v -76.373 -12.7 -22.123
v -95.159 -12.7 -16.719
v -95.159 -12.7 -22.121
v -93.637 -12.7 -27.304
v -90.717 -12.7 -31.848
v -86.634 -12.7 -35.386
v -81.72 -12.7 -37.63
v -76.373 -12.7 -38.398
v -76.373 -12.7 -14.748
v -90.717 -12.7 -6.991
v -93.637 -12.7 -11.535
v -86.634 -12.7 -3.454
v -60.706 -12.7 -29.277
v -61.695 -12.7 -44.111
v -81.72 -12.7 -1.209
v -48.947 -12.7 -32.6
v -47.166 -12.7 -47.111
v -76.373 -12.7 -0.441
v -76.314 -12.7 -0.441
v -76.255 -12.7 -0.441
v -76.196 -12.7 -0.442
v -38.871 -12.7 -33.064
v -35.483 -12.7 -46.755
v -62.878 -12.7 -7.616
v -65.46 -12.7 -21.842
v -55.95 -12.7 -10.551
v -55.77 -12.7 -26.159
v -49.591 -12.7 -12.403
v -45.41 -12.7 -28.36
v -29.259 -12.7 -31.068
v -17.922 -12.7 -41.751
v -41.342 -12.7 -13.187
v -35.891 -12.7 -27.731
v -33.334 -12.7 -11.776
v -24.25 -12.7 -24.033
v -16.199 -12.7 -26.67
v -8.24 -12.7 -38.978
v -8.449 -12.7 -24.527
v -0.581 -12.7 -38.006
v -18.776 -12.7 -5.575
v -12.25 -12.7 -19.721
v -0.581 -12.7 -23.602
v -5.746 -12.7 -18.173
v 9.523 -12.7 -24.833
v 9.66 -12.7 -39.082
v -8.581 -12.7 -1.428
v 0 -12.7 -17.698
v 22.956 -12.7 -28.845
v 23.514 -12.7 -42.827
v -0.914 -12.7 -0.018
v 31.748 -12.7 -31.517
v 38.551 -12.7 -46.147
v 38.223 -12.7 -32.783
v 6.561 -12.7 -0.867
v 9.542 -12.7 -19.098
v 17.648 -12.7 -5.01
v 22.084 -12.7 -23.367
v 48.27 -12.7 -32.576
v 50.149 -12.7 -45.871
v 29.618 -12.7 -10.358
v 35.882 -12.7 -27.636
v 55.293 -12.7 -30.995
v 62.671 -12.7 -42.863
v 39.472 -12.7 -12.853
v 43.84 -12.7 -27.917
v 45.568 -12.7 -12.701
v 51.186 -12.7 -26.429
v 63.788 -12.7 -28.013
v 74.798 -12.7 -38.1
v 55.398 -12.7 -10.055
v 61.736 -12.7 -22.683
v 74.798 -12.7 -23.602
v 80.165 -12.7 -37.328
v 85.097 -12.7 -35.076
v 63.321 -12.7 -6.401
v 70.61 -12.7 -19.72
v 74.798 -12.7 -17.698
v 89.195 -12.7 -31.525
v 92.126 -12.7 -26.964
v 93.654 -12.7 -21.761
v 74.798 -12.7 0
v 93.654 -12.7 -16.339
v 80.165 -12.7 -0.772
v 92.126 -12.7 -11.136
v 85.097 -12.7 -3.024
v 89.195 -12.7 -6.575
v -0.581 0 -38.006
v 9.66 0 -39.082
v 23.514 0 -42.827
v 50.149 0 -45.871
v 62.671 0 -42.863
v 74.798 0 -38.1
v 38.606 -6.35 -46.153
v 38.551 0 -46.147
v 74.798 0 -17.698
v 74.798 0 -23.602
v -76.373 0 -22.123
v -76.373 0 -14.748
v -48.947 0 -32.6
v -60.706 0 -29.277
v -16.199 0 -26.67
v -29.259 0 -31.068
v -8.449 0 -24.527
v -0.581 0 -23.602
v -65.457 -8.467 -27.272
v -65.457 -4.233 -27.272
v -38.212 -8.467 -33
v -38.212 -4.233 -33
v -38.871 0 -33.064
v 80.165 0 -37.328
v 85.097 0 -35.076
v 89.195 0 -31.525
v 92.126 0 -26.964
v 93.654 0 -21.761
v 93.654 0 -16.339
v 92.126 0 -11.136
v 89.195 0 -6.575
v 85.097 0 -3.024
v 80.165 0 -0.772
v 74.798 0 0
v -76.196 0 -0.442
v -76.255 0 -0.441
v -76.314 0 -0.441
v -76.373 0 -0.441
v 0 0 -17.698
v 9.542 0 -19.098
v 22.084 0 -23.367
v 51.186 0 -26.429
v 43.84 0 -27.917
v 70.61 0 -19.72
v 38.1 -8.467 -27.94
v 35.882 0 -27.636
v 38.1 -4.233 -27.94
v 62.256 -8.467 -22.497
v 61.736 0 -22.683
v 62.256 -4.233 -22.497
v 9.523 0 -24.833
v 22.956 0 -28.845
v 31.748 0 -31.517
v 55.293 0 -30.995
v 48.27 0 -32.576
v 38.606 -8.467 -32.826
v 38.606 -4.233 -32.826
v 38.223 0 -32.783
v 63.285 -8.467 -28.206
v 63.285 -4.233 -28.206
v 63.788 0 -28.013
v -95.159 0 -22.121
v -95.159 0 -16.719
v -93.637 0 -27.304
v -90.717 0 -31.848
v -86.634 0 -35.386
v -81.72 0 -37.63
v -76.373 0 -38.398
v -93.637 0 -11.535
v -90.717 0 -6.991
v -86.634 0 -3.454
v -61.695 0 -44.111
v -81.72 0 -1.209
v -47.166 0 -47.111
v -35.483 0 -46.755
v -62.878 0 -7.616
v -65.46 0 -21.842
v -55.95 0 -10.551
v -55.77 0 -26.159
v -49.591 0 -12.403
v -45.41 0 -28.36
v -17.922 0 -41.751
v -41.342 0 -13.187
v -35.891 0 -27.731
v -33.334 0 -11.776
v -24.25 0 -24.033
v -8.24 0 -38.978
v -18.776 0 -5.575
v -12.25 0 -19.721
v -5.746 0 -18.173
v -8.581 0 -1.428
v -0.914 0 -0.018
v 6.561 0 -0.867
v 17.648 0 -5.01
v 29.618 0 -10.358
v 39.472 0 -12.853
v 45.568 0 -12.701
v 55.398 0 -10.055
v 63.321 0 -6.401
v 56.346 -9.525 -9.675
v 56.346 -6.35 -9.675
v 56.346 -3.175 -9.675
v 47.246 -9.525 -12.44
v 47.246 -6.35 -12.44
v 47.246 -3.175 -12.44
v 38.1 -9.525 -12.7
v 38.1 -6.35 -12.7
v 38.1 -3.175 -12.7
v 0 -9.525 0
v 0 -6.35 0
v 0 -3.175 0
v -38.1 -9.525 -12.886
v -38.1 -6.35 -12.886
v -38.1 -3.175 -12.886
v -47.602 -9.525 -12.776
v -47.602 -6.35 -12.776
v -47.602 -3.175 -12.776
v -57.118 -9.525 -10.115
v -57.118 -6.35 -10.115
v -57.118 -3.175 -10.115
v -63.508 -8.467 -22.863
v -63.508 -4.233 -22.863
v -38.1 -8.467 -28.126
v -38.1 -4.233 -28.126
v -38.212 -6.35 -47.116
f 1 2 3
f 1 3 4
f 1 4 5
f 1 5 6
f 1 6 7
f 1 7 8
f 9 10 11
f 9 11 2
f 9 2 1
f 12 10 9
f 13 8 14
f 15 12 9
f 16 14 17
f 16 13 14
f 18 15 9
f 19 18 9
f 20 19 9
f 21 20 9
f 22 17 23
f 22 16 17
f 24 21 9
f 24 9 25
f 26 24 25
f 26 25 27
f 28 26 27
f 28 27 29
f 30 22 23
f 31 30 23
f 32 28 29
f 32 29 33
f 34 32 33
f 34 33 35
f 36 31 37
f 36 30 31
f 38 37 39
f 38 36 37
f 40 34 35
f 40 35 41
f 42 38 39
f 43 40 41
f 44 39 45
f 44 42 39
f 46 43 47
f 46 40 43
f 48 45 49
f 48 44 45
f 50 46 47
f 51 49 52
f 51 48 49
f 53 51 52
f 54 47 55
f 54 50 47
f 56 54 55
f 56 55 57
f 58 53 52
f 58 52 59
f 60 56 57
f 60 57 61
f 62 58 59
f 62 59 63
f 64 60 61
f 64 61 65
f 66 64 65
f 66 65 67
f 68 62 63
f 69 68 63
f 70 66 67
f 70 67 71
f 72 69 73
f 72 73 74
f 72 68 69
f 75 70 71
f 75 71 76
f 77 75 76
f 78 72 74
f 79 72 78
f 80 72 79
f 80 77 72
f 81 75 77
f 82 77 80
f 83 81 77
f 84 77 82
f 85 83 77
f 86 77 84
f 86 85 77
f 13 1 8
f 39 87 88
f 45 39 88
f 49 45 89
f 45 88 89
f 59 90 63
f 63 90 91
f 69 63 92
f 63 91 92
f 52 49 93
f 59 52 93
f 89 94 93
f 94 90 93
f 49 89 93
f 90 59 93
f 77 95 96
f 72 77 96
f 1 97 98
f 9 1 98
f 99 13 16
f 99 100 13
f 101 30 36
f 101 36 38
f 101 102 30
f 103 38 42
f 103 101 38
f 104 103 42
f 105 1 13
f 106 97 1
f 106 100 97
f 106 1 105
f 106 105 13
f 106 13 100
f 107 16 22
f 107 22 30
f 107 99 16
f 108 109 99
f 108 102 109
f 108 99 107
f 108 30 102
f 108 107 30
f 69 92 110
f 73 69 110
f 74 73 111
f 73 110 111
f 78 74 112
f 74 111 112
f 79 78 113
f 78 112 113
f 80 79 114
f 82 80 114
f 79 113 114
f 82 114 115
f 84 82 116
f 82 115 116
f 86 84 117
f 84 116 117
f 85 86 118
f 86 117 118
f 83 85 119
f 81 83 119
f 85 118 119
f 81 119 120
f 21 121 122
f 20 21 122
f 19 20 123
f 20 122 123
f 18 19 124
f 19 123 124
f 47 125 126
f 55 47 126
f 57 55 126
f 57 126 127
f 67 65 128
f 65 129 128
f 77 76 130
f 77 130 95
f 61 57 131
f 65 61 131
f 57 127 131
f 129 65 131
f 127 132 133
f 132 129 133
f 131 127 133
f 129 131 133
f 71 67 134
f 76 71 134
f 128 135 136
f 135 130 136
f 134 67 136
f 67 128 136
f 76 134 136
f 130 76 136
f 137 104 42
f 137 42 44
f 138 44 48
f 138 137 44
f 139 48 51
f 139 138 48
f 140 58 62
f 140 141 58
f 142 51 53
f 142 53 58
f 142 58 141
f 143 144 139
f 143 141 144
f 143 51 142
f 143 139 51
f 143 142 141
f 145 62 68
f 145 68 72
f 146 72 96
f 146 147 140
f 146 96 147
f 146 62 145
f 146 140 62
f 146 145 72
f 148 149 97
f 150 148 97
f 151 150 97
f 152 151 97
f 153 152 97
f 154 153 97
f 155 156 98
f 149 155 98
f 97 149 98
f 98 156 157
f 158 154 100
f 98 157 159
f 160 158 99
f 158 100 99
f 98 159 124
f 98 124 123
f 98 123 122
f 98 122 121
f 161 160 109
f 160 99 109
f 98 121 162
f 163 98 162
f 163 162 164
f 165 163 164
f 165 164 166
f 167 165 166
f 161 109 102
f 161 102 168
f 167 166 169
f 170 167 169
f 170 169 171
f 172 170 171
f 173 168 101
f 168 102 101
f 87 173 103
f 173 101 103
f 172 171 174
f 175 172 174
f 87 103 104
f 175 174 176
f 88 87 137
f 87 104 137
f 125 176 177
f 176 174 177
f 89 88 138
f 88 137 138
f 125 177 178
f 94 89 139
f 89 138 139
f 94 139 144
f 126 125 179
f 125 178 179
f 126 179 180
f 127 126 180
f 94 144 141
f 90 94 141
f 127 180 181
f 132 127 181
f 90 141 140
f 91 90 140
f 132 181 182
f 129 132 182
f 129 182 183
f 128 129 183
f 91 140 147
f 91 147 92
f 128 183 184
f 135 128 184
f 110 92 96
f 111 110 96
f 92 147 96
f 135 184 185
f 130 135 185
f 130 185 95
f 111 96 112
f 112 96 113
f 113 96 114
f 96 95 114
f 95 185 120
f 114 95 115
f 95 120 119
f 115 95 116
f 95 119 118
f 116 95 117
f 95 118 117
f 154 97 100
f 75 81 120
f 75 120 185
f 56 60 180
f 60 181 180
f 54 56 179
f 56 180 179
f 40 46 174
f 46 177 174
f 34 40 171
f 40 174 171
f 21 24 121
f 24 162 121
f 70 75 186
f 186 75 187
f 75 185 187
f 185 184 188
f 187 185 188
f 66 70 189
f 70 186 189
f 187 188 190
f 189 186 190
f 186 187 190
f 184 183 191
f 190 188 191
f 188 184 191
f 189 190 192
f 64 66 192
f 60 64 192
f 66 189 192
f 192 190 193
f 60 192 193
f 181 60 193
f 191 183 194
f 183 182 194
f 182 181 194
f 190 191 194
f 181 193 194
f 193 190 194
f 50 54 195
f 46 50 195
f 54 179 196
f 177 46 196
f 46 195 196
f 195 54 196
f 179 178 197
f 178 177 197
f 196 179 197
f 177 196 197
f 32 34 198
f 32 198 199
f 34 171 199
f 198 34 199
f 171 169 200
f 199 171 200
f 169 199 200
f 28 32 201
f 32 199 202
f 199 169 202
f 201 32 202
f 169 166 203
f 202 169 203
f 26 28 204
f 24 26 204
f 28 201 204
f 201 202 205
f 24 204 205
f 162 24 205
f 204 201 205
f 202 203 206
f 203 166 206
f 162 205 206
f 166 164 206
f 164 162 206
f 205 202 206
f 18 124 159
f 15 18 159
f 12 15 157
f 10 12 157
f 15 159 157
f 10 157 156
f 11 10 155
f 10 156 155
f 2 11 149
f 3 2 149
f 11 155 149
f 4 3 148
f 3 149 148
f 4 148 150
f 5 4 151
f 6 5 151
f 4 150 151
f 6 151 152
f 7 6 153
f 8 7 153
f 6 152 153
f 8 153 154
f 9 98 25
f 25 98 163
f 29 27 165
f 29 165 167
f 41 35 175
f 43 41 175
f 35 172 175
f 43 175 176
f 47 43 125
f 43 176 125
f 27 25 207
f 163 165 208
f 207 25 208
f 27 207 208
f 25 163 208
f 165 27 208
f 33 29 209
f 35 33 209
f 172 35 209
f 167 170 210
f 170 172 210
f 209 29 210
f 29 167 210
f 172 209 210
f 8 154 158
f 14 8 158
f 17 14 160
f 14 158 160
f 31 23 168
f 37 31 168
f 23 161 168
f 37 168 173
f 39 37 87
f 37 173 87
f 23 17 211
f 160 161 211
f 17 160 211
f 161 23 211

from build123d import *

# Parameters (mm, degrees)
F1_DEPTH = 12.7


with BuildPart() as f1:
    # F0 (on Front) → F1 (new body)
    with BuildSketch(Plane.XZ):
        with BuildLine():
            Line((-76.3732939959, -14.74838797), (-76.3732939959, -0.4407114726))
            ThreePointArc((-76.3732939959, -0.4407114726), (-95.3521876711, -19.4196051478), (-76.3732939959, -38.3984988231))
            Line((-76.3732939959, -38.3984988231), (-76.3732939959, -22.1225805581))
            Line((-76.3732939959, -22.1225805581), (-76.3732939959, -19.4196051478))
            Line((-76.3732939959, -19.4196051478), (-76.3732939959, -14.74838797))
        make_face()
        with BuildLine():
            add(Edge.make_bspline(
                [(-76.1963626412, -0.4415362147), (-63.4554494128, -7.7220580595), (-38.0442806352, -21.9071743913), (-12.7646136786, 0.0070951571), (0, 0)],
                knots=[0, 0, 0, 0, 0.2508053785, 0.5020542919, 0.5020542919, 0.5020542919, 0.5020542919], degree=3))
            ThreePointArc((-76.1963626412, -0.4415362147), (-76.2848273574, -0.4409176592), (-76.3732939959, -0.4407114726))
            Line((-76.3732939959, -0.4407114726), (-76.3732939959, -14.74838797))
            add(Edge.make_bspline(
                [(-76.3732939959, -14.74838797), (-72.5969617493, -17.5239941116), (-63.5968037874, -23.7991821261), (-36.7151744714, -33.5297470965), (-13.146769664, -17.5958580302), (0, -17.6980644464)],
                knots=[0, 0, 0, 0, 0.1291381136, 0.2978073868, 0.5059142002, 0.5059142002, 0.5059142002, 0.5059142002], degree=3))
            Line((0, -17.6980644464), (0, 0))
        make_face()
        with BuildLine():
            Line((-76.3732939959, -22.1225805581), (-76.3732939959, -38.3984988231))
            add(Edge.make_bspline(
                [(-76.3732939959, -38.3984988231), (-65.4556199398, -43.4326327745), (-37.2565335761, -53.3774078279), (-13.164973983, -38.3028608946), (-0.580739674, -38.0057516119)],
                knots=[0, 0, 0, 0, 0.2513224035, 0.5012724723, 0.5012724723, 0.5012724723, 0.5012724723], degree=3))
            Line((-0.580739674, -38.0057516119), (-0.580739674, -23.6018691003))
            add(Edge.make_bspline(
                [(-76.3732939959, -22.1225805581), (-73.1589388118, -23.3898365488), (-65.1887553099, -27.9716934806), (-36.6350701075, -38.4616835388), (-13.5775834306, -23.7202191897), (-0.580739674, -23.6018691003)],
                knots=[0, 0, 0, 0, 0.1163648791, 0.2930986778, 0.5017009921, 0.5017009921, 0.5017009921, 0.5017009921], degree=3))
        make_face()
        with BuildLine():
            add(Edge.make_bspline(
                [(-0.580739674, -38.0057516119), (12.2140355622, -37.7036715329), (38.4827264042, -51.7570425047), (63.290761935, -43.1919248679), (74.7976750135, -38.1)],
                knots=[0.5012724723, 0.5012724723, 0.5012724723, 0.5012724723, 0.7554043387, 1, 1, 1, 1], degree=3))
            Line((74.7976750135, -38.1), (74.7976750135, -23.6018691003))
            add(Edge.make_bspline(
                [(-0.580739674, -23.6018691003), (12.6602194247, -23.4812960809), (37.3141008426, -37.8699252067), (62.8787942653, -28.4608125207), (71.2976360715, -25.0581269531), (74.7976750135, -23.6018691003)],
                knots=[0.5017009921, 0.5017009921, 0.5017009921, 0.5017009921, 0.7142214134, 0.8820575377, 1, 1, 1, 1], degree=3))
            Line((-0.580739674, -23.6018691003), (-0.580739674, -38.0057516119))
        make_face()
        with BuildLine():
            add(Edge.make_bspline(
                [(0, 0), (12.7552967066, -0.0070899783), (38.2782597838, -21.7542719189), (62.256161725, -7.166579022), (74.7976750135, 0)],
                knots=[0.5020542919, 0.5020542919, 0.5020542919, 0.5020542919, 0.7531198172, 1, 1, 1, 1], degree=3))
            Line((0, 0), (0, -17.6980644464))
            add(Edge.make_bspline(
                [(0, -17.6980644464), (13.1387482498, -17.8002085021), (36.9175474541, -33.9201664032), (61.7346435389, -21.869234643), (71.1003039311, -19.9781574992), (74.7976750135, -17.6980644464)],
                knots=[0.5059142002, 0.5059142002, 0.5059142002, 0.5059142002, 0.7138940387, 0.8786625487, 1, 1, 1, 1], degree=3))
            Line((74.7976750135, -17.6980644464), (74.7976750135, 0))
        make_face()
        with BuildLine():
            ThreePointArc((74.7976750135, -38.1), (93.8476750135, -19.05), (74.7976750135, 0))
            Line((74.7976750135, 0), (74.7976750135, -17.6980644464))
            Line((74.7976750135, -17.6980644464), (74.7976750135, -19.05))
            Line((74.7976750135, -19.05), (74.7976750135, -23.6018691003))
            Line((74.7976750135, -23.6018691003), (74.7976750135, -38.1))
        make_face()
    extrude(amount=F1_DEPTH)


solid = f1.part
